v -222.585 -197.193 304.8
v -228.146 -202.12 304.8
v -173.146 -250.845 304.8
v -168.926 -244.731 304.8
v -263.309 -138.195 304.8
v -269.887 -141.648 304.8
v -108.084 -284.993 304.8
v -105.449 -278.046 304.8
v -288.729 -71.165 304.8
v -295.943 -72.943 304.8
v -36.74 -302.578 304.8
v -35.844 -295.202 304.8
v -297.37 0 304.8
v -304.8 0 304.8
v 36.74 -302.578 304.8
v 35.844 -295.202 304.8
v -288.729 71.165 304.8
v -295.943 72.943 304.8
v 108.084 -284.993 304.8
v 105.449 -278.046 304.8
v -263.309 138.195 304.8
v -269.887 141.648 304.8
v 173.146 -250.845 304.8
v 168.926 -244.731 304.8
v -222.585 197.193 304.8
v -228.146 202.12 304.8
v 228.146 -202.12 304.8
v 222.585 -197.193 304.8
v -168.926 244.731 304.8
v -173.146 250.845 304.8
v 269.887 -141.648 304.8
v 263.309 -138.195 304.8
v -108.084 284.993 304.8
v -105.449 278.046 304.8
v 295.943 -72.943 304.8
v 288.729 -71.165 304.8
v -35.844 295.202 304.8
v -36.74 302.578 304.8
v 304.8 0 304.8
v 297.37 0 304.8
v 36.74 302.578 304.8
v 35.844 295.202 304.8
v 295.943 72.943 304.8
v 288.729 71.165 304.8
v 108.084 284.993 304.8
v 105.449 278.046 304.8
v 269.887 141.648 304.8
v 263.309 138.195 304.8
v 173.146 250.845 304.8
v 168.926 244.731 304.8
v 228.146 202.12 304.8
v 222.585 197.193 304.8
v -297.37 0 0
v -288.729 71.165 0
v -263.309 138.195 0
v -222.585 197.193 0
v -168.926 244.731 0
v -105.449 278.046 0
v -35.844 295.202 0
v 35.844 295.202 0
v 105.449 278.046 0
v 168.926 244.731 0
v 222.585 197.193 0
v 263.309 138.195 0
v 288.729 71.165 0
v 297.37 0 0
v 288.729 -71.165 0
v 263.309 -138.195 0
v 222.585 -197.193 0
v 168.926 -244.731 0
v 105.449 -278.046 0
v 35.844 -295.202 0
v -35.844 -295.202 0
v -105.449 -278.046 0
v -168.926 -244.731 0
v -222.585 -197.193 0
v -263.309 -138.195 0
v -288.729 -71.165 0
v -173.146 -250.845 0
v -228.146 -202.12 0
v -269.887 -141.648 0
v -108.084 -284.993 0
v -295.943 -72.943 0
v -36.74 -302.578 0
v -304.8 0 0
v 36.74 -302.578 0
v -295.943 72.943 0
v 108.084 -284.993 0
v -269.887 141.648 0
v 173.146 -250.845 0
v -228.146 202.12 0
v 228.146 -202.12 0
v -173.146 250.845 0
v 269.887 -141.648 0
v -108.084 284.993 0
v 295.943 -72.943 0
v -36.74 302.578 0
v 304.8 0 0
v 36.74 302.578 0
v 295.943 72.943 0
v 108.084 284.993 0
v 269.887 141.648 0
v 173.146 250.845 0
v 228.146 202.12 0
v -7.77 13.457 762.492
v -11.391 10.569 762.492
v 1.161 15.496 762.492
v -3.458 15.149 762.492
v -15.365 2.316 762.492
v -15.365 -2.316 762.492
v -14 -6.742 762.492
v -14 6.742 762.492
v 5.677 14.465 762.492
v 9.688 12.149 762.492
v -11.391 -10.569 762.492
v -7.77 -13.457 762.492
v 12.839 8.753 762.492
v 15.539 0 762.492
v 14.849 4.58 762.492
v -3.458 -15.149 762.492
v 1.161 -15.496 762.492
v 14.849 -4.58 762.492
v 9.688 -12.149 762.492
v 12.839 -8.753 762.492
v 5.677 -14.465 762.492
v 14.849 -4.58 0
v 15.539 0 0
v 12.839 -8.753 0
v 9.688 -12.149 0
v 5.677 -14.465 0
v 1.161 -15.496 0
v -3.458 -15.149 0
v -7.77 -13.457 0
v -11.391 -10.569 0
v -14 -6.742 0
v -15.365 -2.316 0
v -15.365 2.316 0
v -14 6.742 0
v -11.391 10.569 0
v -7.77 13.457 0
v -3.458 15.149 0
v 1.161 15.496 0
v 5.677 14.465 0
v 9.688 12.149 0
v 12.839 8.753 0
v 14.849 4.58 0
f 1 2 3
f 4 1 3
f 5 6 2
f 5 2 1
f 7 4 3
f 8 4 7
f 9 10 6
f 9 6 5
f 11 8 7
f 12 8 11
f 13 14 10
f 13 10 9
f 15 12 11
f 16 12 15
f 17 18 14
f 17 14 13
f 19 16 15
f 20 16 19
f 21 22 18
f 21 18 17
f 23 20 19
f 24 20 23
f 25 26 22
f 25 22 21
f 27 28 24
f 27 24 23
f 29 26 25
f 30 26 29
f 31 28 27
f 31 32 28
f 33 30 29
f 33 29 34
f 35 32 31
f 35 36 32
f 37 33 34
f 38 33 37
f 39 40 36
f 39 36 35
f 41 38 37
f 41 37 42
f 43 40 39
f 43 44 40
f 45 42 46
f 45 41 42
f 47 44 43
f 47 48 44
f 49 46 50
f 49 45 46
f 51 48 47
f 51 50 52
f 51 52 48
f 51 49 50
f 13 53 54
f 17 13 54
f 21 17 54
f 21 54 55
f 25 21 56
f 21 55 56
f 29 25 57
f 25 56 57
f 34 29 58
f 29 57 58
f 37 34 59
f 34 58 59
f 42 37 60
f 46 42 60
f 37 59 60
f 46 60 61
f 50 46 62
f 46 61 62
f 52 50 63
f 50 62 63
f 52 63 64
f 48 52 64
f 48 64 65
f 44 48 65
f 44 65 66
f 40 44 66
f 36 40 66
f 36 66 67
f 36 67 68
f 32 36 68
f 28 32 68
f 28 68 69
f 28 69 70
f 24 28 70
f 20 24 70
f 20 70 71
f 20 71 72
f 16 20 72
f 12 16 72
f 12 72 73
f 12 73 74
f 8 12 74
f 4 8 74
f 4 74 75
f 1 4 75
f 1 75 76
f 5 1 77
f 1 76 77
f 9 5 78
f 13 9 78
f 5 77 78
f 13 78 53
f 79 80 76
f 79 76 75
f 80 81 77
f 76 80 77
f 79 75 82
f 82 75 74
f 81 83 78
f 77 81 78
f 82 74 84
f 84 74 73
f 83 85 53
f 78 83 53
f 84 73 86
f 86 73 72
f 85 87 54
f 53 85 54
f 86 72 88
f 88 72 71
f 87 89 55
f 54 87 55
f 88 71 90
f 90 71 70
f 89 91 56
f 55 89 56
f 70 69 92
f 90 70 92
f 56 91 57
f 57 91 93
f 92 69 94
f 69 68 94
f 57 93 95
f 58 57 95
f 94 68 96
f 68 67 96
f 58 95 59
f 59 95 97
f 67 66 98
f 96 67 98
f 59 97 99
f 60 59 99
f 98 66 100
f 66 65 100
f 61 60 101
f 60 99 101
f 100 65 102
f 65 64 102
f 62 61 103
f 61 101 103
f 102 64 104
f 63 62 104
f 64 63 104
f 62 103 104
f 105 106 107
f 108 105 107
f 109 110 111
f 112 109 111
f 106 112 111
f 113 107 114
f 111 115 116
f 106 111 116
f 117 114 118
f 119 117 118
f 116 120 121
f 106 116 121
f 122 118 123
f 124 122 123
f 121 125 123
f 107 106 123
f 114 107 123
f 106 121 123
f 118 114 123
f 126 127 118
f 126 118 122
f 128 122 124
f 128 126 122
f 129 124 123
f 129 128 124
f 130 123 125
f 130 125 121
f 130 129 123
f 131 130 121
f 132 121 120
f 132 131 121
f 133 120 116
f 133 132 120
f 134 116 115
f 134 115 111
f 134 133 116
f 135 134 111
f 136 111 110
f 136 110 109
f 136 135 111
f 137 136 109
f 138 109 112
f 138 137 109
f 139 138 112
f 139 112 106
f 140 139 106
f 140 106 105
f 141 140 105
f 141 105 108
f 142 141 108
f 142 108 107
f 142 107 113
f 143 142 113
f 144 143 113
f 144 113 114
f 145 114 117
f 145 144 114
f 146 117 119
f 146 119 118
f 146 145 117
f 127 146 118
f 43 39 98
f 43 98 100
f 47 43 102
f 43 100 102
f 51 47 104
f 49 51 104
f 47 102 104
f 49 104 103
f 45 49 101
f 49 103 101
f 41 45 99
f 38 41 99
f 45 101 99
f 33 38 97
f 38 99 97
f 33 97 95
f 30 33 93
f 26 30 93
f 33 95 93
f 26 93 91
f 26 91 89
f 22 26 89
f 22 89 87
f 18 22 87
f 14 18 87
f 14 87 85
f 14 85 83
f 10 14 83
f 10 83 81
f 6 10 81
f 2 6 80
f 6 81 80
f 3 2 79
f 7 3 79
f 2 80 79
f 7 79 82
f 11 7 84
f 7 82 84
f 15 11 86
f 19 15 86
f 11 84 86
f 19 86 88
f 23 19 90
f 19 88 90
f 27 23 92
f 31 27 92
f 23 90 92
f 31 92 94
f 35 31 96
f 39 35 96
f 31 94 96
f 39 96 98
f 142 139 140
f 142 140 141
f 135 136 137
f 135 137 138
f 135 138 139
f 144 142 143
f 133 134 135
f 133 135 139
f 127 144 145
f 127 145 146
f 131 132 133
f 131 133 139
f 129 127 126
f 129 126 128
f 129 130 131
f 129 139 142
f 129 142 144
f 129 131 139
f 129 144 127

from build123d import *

# Parameters (mm, degrees)
F0_R     = 304.8
F1_DEPTH = 304.8
F3_D     = 594.741
F4_R     = 15.539023
F5_DEPTH = 762.4917


with BuildPart() as f1:
    # F0 (on Top) → F1 (new body)
    with BuildSketch(Plane.XY):
        Circle(F0_R)
    extrude(amount=F1_DEPTH)

    # F3 (through all)
    with Locations(Plane.XY.offset(304.8)):
        with Locations((0, 0)):
            Hole(F3_D / 2)


with BuildPart() as f5:
    # F4 (on face) → F5 (new body)
    with BuildSketch(Plane(origin=(0, 0, 0), x_dir=(1, 0, 0), z_dir=(0, 0, -1))):
        Circle(F4_R)
    extrude(amount=-F5_DEPTH)


solid = Compound([f1.part, f5.part])
